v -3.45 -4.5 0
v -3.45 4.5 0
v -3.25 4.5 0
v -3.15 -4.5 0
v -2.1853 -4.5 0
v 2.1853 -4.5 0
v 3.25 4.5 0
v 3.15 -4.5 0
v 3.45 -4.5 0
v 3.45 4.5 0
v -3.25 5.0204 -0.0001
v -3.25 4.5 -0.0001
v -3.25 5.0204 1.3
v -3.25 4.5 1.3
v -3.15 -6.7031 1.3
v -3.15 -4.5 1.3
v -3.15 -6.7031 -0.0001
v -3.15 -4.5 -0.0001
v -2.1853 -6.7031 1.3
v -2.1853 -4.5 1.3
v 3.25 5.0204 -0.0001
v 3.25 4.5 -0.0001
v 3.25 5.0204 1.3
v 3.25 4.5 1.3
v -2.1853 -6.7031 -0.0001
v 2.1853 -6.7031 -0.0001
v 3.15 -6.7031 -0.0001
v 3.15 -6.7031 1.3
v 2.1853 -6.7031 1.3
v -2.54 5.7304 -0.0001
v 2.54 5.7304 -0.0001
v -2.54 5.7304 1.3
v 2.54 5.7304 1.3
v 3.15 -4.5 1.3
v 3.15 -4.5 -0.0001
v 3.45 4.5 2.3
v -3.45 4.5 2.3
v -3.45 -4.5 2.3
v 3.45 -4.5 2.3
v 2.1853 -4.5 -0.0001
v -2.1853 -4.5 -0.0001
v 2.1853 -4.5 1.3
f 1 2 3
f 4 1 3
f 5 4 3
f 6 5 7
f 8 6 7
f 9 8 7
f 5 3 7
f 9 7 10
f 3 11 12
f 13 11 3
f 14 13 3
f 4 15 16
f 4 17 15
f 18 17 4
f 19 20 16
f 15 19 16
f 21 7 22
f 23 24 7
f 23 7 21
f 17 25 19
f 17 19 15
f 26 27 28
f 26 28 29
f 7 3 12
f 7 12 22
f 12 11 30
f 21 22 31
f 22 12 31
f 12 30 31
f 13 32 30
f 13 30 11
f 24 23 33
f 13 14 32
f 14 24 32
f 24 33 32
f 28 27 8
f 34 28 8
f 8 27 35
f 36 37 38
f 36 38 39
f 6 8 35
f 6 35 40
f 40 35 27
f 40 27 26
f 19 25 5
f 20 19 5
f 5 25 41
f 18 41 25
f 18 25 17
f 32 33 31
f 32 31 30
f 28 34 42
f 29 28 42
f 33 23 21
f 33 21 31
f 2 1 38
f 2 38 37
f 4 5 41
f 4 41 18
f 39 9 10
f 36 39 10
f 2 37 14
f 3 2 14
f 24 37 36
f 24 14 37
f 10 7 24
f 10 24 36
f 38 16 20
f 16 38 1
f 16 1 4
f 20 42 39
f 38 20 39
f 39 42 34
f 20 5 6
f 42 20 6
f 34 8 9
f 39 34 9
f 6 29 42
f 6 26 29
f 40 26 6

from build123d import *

# Parameters (mm, degrees)
SKETCH1_W           = 6.9
SKETCH1_H           = 9
BOSS_EXTRUDE1_DEPTH = 2.3
SKETCH2_W           = 0.964703619
SKETCH2_H           = 2.203085013
BOSS_EXTRUDE2_DEPTH = 1.3
SKETCH3_W           = 0.964703619
SKETCH3_H           = 2.203085013
BOSS_EXTRUDE3_DEPTH = 0.0001


with BuildPart() as part:
    # Sketch1 → Boss-Extrude1 (new body)
    with BuildSketch(Plane.XY):
        Rectangle(SKETCH1_W, SKETCH1_H)
    extrude(amount=BOSS_EXTRUDE1_DEPTH)

    # Sketch2 → Boss-Extrude2 (add)
    with BuildSketch(Plane(origin=(0, 0, 0), x_dir=(-1, 0, 0), z_dir=(0, 0, -1))):
        Polygon((3.25, 4.5), (3.25, 5.020423263), (2.54, 5.730423263), (-2.54, 5.730423263), (-3.25, 5.020423263), (-3.25, 4.5), align=None)
        with Locations((-2.667648191, -5.601542507)):
            Rectangle(SKETCH2_W, SKETCH2_H)
        with Locations((2.667648191, -5.601542507)):
            Rectangle(SKETCH2_W, SKETCH2_H)
    extrude(amount=-BOSS_EXTRUDE2_DEPTH)

    # Sketch3 → Boss-Extrude3 (add)
    with BuildSketch(Plane(origin=(0, 0, 0), x_dir=(-1, 0, 0), z_dir=(0, 0, -1))):
        Polygon((-3.25, 4.5), (-3.25, 5.020423263), (-2.54, 5.730423263), (2.54, 5.730423263), (3.25, 5.020423263), (3.25, 4.5), align=None)
        with Locations((-2.667648191, -5.601542507)):
            Rectangle(SKETCH3_W, SKETCH3_H)
        with Locations((2.667648191, -5.601542507)):
            Rectangle(SKETCH3_W, SKETCH3_H)
    extrude(amount=BOSS_EXTRUDE3_DEPTH)


solid = part.part
